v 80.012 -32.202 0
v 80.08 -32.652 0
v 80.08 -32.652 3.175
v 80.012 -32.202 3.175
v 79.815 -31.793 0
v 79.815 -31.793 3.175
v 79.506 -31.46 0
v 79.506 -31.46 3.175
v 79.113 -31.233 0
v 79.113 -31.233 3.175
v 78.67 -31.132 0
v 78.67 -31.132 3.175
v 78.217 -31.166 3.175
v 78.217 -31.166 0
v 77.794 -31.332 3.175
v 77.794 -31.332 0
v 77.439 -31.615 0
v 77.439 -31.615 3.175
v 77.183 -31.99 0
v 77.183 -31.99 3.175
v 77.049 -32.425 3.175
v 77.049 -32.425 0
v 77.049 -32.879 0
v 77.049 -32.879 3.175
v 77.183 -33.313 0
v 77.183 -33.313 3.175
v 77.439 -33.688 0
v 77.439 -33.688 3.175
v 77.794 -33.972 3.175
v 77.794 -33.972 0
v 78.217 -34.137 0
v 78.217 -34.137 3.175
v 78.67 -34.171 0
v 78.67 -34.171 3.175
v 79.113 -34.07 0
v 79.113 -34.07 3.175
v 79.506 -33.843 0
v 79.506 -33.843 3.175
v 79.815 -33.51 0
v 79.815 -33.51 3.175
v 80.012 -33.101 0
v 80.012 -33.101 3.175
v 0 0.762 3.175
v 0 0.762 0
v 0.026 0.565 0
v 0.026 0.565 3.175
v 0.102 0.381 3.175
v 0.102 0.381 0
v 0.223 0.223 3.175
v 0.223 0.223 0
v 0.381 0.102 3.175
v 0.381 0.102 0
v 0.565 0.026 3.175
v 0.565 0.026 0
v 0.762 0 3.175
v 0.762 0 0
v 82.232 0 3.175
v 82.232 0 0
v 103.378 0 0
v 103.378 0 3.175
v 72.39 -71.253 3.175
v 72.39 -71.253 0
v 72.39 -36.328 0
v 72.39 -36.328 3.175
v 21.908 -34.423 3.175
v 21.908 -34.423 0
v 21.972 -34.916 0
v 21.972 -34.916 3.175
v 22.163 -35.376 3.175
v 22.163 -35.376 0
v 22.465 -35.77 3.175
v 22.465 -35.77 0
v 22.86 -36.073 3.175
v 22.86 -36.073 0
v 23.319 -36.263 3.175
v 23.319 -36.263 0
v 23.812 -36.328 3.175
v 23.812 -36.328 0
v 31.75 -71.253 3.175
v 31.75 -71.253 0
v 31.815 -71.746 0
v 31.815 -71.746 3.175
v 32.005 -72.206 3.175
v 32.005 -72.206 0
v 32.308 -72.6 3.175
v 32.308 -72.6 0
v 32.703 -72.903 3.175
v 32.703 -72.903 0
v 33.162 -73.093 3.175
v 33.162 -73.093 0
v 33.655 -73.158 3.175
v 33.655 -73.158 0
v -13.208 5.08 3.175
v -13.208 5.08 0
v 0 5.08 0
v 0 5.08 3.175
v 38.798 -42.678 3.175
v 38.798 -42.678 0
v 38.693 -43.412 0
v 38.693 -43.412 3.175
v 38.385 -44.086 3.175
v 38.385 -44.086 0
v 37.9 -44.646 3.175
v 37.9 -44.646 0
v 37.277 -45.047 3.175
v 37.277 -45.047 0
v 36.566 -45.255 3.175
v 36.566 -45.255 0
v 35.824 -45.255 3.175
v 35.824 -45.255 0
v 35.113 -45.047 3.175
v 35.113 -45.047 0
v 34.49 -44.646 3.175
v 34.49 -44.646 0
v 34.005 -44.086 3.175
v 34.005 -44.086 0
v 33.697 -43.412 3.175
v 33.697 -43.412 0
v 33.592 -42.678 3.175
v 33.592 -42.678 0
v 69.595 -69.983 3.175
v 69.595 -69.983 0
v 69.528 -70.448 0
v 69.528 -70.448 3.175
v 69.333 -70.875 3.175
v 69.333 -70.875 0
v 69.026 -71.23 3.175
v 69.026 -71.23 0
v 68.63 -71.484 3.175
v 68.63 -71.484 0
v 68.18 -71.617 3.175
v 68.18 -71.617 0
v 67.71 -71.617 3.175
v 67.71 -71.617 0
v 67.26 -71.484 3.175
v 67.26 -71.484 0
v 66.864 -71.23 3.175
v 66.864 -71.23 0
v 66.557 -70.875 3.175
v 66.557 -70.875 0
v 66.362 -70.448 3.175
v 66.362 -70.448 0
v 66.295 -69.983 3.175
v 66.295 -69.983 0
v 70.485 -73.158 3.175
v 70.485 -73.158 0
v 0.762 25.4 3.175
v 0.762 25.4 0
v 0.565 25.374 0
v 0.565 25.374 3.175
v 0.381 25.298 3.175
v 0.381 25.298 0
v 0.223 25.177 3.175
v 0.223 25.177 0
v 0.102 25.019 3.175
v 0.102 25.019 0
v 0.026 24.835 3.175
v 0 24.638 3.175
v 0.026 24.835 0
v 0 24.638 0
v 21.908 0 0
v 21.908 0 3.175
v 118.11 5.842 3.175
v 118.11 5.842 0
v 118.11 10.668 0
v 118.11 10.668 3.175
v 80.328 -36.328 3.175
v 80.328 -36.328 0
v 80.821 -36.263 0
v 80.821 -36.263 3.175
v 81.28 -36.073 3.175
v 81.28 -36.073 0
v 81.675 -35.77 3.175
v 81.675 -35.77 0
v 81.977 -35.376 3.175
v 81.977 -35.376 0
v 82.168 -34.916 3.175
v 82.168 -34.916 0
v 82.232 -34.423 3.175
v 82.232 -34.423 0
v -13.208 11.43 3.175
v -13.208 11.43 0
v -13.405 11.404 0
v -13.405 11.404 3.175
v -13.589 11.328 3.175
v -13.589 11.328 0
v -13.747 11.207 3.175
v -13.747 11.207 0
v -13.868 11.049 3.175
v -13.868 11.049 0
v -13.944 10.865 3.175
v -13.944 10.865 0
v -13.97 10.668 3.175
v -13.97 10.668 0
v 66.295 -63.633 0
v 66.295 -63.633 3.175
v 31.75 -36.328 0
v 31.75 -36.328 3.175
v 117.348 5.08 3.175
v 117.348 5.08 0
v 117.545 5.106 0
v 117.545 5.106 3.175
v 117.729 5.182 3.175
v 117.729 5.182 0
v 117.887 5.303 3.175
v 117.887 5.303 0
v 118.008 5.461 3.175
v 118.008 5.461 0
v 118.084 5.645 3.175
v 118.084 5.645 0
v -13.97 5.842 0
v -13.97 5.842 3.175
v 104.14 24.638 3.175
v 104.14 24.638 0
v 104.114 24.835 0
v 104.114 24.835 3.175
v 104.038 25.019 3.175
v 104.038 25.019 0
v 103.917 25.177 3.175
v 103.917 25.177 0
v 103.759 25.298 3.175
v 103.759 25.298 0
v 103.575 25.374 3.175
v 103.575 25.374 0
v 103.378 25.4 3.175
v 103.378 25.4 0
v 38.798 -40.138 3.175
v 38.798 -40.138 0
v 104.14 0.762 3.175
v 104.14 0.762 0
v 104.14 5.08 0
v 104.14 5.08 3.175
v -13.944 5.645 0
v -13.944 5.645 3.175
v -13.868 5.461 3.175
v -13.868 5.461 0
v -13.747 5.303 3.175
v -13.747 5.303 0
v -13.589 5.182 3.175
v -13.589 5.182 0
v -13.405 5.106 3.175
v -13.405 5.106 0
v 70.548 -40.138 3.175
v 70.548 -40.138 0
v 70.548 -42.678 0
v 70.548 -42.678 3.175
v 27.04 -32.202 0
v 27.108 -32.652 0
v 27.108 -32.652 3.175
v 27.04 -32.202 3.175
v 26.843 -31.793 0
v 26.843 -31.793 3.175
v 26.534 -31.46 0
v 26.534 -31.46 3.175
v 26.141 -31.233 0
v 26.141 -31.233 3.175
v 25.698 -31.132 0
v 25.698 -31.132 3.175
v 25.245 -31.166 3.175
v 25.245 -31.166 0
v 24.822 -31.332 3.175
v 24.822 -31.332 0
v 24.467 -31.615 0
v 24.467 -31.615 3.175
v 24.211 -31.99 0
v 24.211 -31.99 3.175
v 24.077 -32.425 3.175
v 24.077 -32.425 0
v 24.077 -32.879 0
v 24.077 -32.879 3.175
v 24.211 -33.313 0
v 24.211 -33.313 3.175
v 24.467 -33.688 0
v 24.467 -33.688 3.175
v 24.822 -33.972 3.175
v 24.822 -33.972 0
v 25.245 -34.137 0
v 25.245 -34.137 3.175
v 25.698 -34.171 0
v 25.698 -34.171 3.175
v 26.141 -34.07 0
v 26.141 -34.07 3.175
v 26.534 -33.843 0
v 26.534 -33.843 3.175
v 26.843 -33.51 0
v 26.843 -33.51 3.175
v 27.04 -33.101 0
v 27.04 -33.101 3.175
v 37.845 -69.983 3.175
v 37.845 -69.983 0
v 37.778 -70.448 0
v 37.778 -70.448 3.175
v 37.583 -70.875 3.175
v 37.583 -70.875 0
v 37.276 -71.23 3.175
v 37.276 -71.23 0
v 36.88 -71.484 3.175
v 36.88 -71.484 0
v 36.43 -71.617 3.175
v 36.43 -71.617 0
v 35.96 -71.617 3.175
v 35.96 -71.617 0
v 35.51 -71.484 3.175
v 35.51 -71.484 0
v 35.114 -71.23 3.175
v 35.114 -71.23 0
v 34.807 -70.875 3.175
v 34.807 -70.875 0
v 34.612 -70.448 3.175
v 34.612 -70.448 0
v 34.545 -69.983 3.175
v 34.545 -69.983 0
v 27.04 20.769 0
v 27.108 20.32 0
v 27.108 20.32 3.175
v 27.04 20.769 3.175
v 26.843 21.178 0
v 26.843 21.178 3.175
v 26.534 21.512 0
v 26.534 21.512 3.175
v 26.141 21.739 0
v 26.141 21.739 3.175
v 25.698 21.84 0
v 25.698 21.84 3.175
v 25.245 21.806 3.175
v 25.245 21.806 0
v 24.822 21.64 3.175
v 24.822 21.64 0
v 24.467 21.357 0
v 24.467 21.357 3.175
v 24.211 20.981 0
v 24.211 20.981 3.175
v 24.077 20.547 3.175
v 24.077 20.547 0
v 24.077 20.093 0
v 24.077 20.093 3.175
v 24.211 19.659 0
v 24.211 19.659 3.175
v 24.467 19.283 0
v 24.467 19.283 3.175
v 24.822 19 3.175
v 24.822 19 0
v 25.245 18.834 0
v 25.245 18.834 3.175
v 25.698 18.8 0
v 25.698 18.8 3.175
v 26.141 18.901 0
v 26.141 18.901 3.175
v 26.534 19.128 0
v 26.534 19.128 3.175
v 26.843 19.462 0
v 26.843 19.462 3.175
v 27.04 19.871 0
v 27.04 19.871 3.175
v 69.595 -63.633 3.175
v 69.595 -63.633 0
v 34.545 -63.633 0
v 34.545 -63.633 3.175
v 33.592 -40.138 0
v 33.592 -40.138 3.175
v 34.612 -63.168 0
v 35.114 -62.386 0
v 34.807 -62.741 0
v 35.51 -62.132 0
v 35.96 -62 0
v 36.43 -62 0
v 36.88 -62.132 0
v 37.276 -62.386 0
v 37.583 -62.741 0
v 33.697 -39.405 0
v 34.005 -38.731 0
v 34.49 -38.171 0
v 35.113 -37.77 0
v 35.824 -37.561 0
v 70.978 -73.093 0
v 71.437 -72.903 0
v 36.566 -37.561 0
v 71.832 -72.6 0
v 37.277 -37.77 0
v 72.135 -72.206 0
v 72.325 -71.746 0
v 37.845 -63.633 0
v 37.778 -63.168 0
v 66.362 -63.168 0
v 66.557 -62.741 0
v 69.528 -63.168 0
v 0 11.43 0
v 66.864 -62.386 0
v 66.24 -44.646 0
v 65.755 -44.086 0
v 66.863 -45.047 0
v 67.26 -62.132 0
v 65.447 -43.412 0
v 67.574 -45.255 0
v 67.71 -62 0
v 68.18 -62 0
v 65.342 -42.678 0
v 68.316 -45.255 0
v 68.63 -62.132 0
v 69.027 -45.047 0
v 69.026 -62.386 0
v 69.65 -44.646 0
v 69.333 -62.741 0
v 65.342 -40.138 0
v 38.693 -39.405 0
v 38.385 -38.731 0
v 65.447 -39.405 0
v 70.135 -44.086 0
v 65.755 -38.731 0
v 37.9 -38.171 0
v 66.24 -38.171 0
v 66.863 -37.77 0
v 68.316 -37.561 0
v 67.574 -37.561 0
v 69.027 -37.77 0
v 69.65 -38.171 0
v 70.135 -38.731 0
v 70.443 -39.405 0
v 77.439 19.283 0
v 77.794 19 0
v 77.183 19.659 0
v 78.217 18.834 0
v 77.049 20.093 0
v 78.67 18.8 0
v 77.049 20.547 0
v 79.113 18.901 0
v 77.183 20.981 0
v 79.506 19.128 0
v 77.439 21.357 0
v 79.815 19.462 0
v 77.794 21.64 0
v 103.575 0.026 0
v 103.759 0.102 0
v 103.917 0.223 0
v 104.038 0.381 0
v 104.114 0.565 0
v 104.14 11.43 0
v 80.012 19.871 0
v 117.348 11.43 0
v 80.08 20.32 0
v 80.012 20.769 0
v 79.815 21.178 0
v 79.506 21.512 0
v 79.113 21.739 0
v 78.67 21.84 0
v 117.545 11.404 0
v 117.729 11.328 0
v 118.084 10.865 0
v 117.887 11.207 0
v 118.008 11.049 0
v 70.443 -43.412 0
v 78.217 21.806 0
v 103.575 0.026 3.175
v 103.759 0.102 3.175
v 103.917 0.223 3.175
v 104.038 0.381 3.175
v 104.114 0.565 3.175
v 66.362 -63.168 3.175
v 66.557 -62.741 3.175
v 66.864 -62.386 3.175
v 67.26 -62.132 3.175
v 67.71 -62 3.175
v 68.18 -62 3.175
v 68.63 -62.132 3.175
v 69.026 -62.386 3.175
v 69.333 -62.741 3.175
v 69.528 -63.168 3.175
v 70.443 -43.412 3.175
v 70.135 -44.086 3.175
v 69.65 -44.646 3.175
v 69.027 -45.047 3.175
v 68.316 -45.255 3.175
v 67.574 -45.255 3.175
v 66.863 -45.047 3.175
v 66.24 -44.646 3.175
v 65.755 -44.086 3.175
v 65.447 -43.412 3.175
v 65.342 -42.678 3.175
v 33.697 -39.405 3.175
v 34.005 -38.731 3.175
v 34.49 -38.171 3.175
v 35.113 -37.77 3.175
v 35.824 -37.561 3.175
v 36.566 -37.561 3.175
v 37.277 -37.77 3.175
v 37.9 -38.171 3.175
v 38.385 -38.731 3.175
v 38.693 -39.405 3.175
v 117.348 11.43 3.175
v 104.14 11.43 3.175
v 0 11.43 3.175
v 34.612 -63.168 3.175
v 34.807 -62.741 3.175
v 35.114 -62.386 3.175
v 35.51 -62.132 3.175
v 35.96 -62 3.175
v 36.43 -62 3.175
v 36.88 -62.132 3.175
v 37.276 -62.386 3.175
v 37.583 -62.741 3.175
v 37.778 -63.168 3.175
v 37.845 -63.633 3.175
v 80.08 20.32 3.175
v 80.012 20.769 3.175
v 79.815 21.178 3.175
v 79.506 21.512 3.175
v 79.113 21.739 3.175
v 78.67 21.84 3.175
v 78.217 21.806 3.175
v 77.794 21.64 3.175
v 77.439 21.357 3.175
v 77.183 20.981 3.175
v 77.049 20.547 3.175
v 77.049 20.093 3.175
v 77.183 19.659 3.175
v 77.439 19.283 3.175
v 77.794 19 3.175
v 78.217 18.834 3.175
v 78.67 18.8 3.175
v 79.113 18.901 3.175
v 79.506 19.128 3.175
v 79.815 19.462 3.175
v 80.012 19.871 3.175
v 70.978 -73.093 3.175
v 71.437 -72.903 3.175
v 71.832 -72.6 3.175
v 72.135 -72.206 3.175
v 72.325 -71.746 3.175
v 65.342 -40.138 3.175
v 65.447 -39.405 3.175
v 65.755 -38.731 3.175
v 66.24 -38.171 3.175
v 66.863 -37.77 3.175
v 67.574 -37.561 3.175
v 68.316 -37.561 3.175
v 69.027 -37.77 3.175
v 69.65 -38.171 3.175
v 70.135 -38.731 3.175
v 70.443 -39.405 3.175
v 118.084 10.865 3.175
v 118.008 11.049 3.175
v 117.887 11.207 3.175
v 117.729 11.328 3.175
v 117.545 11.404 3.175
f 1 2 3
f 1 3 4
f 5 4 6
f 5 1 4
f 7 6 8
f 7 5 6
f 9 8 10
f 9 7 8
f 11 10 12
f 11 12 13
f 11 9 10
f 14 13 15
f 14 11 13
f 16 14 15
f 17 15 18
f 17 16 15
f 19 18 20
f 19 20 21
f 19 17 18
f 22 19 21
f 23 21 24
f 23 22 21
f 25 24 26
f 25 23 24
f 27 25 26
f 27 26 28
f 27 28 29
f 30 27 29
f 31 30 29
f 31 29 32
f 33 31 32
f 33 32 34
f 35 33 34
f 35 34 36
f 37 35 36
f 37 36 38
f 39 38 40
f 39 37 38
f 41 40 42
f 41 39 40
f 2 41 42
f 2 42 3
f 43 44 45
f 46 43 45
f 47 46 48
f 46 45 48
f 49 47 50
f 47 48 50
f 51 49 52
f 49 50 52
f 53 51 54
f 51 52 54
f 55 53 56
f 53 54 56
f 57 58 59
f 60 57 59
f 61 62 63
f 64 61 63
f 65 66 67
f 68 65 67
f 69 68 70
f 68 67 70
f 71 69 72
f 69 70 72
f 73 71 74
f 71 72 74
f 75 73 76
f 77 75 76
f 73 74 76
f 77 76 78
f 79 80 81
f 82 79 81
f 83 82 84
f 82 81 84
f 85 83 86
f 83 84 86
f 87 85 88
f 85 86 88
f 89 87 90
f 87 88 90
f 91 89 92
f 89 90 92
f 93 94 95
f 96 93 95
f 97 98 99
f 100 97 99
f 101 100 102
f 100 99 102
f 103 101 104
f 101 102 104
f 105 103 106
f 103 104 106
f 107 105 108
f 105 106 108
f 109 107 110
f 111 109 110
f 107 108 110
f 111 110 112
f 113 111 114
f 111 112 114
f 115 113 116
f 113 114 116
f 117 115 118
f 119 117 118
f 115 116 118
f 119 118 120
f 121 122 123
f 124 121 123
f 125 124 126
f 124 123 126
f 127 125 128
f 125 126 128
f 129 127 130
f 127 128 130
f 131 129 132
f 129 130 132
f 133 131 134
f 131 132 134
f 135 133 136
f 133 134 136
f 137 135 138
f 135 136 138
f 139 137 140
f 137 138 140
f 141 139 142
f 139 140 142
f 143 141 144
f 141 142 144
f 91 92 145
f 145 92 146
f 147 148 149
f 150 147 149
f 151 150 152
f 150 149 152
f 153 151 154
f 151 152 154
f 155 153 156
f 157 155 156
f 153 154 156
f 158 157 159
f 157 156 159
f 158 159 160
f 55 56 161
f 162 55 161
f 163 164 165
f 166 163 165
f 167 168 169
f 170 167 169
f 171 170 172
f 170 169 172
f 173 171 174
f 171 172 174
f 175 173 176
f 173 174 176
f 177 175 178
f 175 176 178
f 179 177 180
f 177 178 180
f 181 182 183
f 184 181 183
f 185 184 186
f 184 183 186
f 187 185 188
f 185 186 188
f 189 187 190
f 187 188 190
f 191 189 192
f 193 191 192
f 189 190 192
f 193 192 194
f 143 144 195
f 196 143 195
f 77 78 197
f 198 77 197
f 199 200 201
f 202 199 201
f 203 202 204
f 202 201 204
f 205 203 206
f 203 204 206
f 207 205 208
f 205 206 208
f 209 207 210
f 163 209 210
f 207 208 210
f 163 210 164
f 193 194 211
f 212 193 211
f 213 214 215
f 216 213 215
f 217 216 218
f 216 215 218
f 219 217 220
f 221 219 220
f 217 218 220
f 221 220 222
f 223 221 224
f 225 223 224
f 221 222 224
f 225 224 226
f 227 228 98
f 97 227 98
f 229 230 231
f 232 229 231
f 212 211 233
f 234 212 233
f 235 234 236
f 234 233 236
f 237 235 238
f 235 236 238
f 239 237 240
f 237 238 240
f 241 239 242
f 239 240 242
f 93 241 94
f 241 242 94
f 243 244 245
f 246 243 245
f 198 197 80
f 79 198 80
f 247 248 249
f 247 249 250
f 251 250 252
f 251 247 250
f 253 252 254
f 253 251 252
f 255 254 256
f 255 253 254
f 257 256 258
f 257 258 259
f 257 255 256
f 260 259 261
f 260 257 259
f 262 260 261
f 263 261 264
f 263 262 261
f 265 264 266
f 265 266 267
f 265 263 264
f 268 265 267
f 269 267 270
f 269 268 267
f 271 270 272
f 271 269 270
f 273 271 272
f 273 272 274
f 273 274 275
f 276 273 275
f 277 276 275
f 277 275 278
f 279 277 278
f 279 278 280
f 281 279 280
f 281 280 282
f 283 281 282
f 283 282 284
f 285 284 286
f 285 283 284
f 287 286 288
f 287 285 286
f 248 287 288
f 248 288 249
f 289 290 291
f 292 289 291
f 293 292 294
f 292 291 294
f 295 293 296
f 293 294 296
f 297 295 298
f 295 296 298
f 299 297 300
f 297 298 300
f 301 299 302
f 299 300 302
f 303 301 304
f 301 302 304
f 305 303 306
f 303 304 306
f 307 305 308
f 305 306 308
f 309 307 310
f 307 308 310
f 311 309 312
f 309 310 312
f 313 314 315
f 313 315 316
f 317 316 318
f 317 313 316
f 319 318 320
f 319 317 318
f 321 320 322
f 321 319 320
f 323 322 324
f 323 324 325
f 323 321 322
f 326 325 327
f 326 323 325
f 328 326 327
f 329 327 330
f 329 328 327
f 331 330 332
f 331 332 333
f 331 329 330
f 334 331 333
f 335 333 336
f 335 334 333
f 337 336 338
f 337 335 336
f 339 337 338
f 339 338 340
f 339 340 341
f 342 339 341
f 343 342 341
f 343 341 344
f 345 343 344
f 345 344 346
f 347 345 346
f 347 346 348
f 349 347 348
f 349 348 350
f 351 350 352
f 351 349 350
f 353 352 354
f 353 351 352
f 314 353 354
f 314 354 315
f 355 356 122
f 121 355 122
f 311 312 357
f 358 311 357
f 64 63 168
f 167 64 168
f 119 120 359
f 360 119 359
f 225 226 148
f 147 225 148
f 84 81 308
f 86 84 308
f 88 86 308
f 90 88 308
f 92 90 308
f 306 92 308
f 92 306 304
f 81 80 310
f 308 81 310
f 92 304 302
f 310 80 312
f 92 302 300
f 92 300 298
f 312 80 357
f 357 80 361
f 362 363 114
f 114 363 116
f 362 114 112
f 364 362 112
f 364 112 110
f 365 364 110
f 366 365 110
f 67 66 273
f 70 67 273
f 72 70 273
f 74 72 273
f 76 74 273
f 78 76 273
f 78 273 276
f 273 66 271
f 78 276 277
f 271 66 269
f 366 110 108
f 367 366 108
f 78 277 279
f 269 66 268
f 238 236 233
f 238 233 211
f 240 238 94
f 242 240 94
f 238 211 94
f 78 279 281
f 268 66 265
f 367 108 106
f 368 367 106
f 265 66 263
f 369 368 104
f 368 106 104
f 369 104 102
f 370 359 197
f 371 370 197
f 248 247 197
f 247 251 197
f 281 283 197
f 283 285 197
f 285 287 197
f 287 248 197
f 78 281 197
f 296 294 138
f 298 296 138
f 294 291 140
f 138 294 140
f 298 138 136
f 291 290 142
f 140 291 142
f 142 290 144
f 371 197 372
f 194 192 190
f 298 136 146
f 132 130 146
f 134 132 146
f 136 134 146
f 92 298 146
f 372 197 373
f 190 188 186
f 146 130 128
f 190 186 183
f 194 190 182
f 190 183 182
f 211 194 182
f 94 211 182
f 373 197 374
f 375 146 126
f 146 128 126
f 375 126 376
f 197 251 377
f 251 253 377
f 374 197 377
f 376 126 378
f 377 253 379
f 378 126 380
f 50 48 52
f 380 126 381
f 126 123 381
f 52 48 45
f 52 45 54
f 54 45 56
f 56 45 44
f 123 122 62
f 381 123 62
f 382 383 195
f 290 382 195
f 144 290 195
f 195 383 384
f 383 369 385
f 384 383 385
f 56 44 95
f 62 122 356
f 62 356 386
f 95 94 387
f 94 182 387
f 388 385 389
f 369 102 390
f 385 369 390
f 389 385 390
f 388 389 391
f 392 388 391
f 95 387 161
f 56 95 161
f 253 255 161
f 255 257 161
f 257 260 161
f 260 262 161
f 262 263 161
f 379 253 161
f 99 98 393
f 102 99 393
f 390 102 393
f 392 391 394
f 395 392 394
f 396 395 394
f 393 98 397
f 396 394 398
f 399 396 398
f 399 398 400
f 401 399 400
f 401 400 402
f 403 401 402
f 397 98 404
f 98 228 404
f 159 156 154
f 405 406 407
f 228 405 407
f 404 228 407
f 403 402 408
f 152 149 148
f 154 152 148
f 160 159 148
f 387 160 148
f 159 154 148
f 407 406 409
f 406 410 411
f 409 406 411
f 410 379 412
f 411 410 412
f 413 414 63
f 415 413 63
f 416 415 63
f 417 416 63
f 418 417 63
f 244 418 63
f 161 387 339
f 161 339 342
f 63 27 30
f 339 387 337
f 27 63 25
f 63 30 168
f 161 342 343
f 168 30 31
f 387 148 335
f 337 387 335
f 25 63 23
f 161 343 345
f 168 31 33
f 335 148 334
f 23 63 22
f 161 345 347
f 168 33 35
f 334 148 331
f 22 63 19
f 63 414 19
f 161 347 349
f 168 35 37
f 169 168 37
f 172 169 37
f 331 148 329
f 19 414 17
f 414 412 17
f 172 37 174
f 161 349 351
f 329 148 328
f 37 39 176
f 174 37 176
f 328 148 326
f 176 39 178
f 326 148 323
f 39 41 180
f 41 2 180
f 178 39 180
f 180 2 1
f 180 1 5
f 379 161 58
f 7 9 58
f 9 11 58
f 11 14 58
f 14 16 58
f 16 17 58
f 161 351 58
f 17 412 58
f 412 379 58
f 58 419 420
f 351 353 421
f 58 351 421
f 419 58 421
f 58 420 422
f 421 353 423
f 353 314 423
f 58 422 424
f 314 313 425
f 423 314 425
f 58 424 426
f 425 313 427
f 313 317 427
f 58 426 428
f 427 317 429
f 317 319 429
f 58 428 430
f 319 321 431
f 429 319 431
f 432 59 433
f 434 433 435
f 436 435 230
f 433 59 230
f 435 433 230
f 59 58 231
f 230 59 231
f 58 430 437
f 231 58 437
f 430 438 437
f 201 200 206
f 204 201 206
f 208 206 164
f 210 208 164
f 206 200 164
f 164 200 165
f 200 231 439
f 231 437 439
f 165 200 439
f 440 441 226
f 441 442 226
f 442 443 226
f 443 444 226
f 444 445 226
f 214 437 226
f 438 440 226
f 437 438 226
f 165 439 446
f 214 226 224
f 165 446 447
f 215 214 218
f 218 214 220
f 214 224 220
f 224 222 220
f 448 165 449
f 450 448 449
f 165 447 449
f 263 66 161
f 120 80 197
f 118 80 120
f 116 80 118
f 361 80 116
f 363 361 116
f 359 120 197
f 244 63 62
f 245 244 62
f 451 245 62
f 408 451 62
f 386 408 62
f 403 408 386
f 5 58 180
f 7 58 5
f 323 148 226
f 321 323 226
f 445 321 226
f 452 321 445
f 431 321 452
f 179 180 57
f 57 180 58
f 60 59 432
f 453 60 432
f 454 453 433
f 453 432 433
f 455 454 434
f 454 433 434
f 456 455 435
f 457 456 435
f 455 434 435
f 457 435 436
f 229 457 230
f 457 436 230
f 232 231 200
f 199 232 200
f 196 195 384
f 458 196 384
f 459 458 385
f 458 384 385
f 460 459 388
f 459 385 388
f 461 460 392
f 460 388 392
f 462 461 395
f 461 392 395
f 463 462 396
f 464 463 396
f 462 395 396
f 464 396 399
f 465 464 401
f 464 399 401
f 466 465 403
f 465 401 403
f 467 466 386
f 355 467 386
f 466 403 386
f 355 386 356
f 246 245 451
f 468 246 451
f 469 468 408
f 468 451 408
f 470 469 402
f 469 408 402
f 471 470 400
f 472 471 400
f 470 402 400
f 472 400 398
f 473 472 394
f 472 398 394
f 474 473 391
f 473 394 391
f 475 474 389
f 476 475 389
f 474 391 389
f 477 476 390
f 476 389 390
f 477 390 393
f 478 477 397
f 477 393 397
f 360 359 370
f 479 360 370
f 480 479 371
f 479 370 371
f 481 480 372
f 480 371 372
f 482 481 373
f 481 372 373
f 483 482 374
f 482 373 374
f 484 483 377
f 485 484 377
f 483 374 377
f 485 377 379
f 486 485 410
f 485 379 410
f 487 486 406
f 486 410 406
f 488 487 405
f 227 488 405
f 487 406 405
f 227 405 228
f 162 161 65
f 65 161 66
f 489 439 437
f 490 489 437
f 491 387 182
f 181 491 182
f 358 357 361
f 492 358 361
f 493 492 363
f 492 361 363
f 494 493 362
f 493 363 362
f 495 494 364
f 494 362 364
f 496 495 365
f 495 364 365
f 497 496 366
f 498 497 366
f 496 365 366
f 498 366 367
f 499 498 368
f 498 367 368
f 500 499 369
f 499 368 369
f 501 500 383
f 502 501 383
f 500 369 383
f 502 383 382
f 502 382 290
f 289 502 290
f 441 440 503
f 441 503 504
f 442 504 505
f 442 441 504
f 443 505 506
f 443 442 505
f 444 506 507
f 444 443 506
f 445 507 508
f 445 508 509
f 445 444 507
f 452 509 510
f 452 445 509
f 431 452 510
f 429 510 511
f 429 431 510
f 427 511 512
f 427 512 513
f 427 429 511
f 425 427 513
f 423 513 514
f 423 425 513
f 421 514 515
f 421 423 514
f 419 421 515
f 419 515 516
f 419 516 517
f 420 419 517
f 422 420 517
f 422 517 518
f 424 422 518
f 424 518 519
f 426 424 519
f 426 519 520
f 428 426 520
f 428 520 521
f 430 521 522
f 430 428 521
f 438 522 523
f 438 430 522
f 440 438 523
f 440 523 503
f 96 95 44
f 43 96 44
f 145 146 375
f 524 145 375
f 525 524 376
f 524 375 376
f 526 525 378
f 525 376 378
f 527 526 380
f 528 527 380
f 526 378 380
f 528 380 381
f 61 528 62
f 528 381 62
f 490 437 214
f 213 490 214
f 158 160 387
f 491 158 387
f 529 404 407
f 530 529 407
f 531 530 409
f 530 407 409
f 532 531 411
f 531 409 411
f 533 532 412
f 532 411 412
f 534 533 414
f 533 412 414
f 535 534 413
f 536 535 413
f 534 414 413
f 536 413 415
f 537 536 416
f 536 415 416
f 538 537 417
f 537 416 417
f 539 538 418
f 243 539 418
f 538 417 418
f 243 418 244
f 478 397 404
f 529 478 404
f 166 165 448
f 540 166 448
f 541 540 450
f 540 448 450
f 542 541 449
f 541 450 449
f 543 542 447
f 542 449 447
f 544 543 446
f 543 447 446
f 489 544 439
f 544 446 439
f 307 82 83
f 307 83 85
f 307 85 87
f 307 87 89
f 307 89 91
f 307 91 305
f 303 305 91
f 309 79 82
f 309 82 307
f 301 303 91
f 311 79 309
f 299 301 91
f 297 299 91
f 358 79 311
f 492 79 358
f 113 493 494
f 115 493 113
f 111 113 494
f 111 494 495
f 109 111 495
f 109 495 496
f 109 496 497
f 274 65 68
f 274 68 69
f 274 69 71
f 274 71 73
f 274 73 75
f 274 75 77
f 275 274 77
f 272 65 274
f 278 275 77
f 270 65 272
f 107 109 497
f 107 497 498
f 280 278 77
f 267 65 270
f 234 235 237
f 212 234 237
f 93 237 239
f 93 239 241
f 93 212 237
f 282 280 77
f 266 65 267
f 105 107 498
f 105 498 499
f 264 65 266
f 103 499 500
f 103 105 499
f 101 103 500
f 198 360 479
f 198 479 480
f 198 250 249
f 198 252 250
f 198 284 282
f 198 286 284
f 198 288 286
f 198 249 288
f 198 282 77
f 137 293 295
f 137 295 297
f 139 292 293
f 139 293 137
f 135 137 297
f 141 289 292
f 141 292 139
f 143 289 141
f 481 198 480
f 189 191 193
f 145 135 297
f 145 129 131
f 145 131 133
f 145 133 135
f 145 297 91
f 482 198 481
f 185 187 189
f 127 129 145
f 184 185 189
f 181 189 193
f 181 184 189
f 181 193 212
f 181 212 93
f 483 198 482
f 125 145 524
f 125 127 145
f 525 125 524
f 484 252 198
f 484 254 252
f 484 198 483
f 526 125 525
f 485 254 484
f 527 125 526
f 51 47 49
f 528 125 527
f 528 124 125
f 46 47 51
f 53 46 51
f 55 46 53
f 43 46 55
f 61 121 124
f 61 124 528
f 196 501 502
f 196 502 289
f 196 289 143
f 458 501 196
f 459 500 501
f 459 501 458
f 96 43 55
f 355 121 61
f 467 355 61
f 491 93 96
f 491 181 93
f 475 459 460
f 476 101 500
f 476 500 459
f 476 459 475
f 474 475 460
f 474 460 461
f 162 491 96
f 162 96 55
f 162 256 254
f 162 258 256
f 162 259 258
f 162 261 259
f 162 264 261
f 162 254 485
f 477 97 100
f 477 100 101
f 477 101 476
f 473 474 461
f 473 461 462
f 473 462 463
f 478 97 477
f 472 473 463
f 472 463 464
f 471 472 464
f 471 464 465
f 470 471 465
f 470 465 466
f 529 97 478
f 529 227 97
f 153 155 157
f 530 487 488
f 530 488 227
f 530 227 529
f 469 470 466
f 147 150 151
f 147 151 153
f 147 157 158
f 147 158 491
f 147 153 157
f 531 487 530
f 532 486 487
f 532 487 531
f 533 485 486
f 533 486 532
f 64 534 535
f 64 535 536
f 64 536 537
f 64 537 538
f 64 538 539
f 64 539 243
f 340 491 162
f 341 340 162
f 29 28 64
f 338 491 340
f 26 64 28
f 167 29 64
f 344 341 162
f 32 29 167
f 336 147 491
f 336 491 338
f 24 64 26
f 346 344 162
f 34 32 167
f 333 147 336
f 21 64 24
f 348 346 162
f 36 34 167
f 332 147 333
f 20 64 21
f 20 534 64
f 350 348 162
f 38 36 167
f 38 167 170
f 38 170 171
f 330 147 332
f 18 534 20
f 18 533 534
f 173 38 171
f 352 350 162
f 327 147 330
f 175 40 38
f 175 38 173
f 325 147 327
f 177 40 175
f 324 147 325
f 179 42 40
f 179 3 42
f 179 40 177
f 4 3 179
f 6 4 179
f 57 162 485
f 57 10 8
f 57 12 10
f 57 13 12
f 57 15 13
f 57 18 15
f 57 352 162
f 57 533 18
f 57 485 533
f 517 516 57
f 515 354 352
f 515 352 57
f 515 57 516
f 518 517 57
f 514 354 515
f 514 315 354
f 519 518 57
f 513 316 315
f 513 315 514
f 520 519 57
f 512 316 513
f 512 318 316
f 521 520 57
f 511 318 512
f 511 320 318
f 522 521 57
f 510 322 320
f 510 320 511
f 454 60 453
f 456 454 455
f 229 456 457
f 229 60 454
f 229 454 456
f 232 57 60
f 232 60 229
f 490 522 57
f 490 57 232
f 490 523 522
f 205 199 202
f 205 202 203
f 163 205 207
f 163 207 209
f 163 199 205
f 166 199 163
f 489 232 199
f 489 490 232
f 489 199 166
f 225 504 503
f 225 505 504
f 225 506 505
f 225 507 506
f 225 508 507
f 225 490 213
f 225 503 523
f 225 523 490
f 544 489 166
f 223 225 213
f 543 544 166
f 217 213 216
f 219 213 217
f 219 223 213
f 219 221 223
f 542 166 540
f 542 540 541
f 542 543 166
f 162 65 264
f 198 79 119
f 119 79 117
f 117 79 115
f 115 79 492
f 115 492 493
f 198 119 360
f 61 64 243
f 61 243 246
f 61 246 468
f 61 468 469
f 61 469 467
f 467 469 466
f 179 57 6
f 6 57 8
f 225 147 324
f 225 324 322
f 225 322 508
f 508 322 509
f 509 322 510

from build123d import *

# Parameters (mm, degrees)
SKETCH1_R           = 1.524
BOSS_EXTRUDE1_DEPTH = 3.175


with BuildPart() as part:
    # Sketch1 → Boss-Extrude1 (new body)
    with BuildSketch(Plane.XY):
        with BuildLine():
            Line((0.762, 0), (21.9075, 0))
            Line((21.9075, 0), (21.9075, -34.42335))
            ThreePointArc((21.9075, -34.42335), (22.465461582, -35.770388418), (23.8125, -36.32835))
            Line((23.8125, -36.32835), (31.75, -36.32835))
            Line((31.75, -36.32835), (31.75, -71.25335))
            ThreePointArc((31.75, -71.25335), (32.307961582, -72.600388418), (33.655, -73.15835))
            Line((33.655, -73.15835), (70.485, -73.15835))
            ThreePointArc((70.485, -73.15835), (71.832038418, -72.600388418), (72.39, -71.25335))
            Line((72.39, -71.25335), (72.39, -36.32835))
            Line((72.39, -36.32835), (80.3275, -36.32835))
            ThreePointArc((80.3275, -36.32835), (81.674538418, -35.770388418), (82.2325, -34.42335))
            Line((82.2325, -34.42335), (82.2325, 0))
            Line((82.2325, 0), (103.378, 0))
            ThreePointArc((103.378, 0), (103.916815367, 0.223184633), (104.14, 0.762))
            Line((104.14, 0.762), (104.14, 5.08))
            Line((104.14, 5.08), (117.348, 5.08))
            ThreePointArc((117.348, 5.08), (117.886815367, 5.303184633), (118.11, 5.842))
            Line((118.11, 5.842), (118.11, 10.668))
            ThreePointArc((118.11, 10.668), (117.886815367, 11.206815367), (117.348, 11.43))
            Line((117.348, 11.43), (104.14, 11.43))
            Line((104.14, 11.43), (104.14, 24.638))
            ThreePointArc((104.14, 24.638), (103.916815367, 25.176815367), (103.378, 25.4))
            Line((103.378, 25.4), (0.762, 25.4))
            ThreePointArc((0.762, 25.4), (0.223184633, 25.176815367), (0, 24.638))
            Line((0, 24.638), (0, 11.43))
            Line((0, 11.43), (-13.208, 11.43))
            ThreePointArc((-13.208, 11.43), (-13.746815367, 11.206815367), (-13.97, 10.668))
            Line((-13.97, 10.668), (-13.97, 5.842))
            ThreePointArc((-13.97, 5.842), (-13.746815367, 5.303184633), (-13.208, 5.08))
            Line((-13.208, 5.08), (0, 5.08))
            Line((0, 5.08), (0, 0.762))
            ThreePointArc((0, 0.762), (0.223184633, 0.223184633), (0.762, 0))
        make_face()
        with Locations((25.58415, 20.32)):
            Circle(SKETCH1_R, mode=Mode.SUBTRACT)
        with Locations((78.55585, 20.32)):
            Circle(SKETCH1_R, mode=Mode.SUBTRACT)
        with Locations((78.55585, -32.6517)):
            Circle(SKETCH1_R, mode=Mode.SUBTRACT)
        with Locations((25.58415, -32.6517)):
            Circle(SKETCH1_R, mode=Mode.SUBTRACT)
        with BuildLine():
            Line((38.7985, -40.13835), (38.7985, -42.67835))
            ThreePointArc((38.7985, -42.67835), (36.195, -45.28185), (33.5915, -42.67835))
            Line((33.5915, -42.67835), (33.5915, -40.13835))
            ThreePointArc((33.5915, -40.13835), (36.195, -37.53485), (38.7985, -40.13835))
        make_face(mode=Mode.SUBTRACT)
        with BuildLine():
            Line((70.5485, -40.13835), (70.5485, -42.67835))
            ThreePointArc((70.5485, -42.67835), (67.945, -45.28185), (65.3415, -42.67835))
            Line((65.3415, -42.67835), (65.3415, -40.13835))
            ThreePointArc((65.3415, -40.13835), (67.945, -37.53485), (70.5485, -40.13835))
        make_face(mode=Mode.SUBTRACT)
        with BuildLine():
            Line((69.595, -63.63335), (69.595, -69.98335))
            ThreePointArc((69.595, -69.98335), (67.945, -71.63335), (66.295, -69.98335))
            Line((66.295, -69.98335), (66.295, -63.63335))
            ThreePointArc((66.295, -63.63335), (67.945, -61.98335), (69.595, -63.63335))
        make_face(mode=Mode.SUBTRACT)
        with BuildLine():
            Line((37.845, -63.63335), (37.845, -69.98335))
            ThreePointArc((37.845, -69.98335), (36.195, -71.63335), (34.545, -69.98335))
            Line((34.545, -69.98335), (34.545, -63.63335))
            ThreePointArc((34.545, -63.63335), (36.195, -61.98335), (37.845, -63.63335))
        make_face(mode=Mode.SUBTRACT)
    extrude(amount=BOSS_EXTRUDE1_DEPTH)


solid = part.part
